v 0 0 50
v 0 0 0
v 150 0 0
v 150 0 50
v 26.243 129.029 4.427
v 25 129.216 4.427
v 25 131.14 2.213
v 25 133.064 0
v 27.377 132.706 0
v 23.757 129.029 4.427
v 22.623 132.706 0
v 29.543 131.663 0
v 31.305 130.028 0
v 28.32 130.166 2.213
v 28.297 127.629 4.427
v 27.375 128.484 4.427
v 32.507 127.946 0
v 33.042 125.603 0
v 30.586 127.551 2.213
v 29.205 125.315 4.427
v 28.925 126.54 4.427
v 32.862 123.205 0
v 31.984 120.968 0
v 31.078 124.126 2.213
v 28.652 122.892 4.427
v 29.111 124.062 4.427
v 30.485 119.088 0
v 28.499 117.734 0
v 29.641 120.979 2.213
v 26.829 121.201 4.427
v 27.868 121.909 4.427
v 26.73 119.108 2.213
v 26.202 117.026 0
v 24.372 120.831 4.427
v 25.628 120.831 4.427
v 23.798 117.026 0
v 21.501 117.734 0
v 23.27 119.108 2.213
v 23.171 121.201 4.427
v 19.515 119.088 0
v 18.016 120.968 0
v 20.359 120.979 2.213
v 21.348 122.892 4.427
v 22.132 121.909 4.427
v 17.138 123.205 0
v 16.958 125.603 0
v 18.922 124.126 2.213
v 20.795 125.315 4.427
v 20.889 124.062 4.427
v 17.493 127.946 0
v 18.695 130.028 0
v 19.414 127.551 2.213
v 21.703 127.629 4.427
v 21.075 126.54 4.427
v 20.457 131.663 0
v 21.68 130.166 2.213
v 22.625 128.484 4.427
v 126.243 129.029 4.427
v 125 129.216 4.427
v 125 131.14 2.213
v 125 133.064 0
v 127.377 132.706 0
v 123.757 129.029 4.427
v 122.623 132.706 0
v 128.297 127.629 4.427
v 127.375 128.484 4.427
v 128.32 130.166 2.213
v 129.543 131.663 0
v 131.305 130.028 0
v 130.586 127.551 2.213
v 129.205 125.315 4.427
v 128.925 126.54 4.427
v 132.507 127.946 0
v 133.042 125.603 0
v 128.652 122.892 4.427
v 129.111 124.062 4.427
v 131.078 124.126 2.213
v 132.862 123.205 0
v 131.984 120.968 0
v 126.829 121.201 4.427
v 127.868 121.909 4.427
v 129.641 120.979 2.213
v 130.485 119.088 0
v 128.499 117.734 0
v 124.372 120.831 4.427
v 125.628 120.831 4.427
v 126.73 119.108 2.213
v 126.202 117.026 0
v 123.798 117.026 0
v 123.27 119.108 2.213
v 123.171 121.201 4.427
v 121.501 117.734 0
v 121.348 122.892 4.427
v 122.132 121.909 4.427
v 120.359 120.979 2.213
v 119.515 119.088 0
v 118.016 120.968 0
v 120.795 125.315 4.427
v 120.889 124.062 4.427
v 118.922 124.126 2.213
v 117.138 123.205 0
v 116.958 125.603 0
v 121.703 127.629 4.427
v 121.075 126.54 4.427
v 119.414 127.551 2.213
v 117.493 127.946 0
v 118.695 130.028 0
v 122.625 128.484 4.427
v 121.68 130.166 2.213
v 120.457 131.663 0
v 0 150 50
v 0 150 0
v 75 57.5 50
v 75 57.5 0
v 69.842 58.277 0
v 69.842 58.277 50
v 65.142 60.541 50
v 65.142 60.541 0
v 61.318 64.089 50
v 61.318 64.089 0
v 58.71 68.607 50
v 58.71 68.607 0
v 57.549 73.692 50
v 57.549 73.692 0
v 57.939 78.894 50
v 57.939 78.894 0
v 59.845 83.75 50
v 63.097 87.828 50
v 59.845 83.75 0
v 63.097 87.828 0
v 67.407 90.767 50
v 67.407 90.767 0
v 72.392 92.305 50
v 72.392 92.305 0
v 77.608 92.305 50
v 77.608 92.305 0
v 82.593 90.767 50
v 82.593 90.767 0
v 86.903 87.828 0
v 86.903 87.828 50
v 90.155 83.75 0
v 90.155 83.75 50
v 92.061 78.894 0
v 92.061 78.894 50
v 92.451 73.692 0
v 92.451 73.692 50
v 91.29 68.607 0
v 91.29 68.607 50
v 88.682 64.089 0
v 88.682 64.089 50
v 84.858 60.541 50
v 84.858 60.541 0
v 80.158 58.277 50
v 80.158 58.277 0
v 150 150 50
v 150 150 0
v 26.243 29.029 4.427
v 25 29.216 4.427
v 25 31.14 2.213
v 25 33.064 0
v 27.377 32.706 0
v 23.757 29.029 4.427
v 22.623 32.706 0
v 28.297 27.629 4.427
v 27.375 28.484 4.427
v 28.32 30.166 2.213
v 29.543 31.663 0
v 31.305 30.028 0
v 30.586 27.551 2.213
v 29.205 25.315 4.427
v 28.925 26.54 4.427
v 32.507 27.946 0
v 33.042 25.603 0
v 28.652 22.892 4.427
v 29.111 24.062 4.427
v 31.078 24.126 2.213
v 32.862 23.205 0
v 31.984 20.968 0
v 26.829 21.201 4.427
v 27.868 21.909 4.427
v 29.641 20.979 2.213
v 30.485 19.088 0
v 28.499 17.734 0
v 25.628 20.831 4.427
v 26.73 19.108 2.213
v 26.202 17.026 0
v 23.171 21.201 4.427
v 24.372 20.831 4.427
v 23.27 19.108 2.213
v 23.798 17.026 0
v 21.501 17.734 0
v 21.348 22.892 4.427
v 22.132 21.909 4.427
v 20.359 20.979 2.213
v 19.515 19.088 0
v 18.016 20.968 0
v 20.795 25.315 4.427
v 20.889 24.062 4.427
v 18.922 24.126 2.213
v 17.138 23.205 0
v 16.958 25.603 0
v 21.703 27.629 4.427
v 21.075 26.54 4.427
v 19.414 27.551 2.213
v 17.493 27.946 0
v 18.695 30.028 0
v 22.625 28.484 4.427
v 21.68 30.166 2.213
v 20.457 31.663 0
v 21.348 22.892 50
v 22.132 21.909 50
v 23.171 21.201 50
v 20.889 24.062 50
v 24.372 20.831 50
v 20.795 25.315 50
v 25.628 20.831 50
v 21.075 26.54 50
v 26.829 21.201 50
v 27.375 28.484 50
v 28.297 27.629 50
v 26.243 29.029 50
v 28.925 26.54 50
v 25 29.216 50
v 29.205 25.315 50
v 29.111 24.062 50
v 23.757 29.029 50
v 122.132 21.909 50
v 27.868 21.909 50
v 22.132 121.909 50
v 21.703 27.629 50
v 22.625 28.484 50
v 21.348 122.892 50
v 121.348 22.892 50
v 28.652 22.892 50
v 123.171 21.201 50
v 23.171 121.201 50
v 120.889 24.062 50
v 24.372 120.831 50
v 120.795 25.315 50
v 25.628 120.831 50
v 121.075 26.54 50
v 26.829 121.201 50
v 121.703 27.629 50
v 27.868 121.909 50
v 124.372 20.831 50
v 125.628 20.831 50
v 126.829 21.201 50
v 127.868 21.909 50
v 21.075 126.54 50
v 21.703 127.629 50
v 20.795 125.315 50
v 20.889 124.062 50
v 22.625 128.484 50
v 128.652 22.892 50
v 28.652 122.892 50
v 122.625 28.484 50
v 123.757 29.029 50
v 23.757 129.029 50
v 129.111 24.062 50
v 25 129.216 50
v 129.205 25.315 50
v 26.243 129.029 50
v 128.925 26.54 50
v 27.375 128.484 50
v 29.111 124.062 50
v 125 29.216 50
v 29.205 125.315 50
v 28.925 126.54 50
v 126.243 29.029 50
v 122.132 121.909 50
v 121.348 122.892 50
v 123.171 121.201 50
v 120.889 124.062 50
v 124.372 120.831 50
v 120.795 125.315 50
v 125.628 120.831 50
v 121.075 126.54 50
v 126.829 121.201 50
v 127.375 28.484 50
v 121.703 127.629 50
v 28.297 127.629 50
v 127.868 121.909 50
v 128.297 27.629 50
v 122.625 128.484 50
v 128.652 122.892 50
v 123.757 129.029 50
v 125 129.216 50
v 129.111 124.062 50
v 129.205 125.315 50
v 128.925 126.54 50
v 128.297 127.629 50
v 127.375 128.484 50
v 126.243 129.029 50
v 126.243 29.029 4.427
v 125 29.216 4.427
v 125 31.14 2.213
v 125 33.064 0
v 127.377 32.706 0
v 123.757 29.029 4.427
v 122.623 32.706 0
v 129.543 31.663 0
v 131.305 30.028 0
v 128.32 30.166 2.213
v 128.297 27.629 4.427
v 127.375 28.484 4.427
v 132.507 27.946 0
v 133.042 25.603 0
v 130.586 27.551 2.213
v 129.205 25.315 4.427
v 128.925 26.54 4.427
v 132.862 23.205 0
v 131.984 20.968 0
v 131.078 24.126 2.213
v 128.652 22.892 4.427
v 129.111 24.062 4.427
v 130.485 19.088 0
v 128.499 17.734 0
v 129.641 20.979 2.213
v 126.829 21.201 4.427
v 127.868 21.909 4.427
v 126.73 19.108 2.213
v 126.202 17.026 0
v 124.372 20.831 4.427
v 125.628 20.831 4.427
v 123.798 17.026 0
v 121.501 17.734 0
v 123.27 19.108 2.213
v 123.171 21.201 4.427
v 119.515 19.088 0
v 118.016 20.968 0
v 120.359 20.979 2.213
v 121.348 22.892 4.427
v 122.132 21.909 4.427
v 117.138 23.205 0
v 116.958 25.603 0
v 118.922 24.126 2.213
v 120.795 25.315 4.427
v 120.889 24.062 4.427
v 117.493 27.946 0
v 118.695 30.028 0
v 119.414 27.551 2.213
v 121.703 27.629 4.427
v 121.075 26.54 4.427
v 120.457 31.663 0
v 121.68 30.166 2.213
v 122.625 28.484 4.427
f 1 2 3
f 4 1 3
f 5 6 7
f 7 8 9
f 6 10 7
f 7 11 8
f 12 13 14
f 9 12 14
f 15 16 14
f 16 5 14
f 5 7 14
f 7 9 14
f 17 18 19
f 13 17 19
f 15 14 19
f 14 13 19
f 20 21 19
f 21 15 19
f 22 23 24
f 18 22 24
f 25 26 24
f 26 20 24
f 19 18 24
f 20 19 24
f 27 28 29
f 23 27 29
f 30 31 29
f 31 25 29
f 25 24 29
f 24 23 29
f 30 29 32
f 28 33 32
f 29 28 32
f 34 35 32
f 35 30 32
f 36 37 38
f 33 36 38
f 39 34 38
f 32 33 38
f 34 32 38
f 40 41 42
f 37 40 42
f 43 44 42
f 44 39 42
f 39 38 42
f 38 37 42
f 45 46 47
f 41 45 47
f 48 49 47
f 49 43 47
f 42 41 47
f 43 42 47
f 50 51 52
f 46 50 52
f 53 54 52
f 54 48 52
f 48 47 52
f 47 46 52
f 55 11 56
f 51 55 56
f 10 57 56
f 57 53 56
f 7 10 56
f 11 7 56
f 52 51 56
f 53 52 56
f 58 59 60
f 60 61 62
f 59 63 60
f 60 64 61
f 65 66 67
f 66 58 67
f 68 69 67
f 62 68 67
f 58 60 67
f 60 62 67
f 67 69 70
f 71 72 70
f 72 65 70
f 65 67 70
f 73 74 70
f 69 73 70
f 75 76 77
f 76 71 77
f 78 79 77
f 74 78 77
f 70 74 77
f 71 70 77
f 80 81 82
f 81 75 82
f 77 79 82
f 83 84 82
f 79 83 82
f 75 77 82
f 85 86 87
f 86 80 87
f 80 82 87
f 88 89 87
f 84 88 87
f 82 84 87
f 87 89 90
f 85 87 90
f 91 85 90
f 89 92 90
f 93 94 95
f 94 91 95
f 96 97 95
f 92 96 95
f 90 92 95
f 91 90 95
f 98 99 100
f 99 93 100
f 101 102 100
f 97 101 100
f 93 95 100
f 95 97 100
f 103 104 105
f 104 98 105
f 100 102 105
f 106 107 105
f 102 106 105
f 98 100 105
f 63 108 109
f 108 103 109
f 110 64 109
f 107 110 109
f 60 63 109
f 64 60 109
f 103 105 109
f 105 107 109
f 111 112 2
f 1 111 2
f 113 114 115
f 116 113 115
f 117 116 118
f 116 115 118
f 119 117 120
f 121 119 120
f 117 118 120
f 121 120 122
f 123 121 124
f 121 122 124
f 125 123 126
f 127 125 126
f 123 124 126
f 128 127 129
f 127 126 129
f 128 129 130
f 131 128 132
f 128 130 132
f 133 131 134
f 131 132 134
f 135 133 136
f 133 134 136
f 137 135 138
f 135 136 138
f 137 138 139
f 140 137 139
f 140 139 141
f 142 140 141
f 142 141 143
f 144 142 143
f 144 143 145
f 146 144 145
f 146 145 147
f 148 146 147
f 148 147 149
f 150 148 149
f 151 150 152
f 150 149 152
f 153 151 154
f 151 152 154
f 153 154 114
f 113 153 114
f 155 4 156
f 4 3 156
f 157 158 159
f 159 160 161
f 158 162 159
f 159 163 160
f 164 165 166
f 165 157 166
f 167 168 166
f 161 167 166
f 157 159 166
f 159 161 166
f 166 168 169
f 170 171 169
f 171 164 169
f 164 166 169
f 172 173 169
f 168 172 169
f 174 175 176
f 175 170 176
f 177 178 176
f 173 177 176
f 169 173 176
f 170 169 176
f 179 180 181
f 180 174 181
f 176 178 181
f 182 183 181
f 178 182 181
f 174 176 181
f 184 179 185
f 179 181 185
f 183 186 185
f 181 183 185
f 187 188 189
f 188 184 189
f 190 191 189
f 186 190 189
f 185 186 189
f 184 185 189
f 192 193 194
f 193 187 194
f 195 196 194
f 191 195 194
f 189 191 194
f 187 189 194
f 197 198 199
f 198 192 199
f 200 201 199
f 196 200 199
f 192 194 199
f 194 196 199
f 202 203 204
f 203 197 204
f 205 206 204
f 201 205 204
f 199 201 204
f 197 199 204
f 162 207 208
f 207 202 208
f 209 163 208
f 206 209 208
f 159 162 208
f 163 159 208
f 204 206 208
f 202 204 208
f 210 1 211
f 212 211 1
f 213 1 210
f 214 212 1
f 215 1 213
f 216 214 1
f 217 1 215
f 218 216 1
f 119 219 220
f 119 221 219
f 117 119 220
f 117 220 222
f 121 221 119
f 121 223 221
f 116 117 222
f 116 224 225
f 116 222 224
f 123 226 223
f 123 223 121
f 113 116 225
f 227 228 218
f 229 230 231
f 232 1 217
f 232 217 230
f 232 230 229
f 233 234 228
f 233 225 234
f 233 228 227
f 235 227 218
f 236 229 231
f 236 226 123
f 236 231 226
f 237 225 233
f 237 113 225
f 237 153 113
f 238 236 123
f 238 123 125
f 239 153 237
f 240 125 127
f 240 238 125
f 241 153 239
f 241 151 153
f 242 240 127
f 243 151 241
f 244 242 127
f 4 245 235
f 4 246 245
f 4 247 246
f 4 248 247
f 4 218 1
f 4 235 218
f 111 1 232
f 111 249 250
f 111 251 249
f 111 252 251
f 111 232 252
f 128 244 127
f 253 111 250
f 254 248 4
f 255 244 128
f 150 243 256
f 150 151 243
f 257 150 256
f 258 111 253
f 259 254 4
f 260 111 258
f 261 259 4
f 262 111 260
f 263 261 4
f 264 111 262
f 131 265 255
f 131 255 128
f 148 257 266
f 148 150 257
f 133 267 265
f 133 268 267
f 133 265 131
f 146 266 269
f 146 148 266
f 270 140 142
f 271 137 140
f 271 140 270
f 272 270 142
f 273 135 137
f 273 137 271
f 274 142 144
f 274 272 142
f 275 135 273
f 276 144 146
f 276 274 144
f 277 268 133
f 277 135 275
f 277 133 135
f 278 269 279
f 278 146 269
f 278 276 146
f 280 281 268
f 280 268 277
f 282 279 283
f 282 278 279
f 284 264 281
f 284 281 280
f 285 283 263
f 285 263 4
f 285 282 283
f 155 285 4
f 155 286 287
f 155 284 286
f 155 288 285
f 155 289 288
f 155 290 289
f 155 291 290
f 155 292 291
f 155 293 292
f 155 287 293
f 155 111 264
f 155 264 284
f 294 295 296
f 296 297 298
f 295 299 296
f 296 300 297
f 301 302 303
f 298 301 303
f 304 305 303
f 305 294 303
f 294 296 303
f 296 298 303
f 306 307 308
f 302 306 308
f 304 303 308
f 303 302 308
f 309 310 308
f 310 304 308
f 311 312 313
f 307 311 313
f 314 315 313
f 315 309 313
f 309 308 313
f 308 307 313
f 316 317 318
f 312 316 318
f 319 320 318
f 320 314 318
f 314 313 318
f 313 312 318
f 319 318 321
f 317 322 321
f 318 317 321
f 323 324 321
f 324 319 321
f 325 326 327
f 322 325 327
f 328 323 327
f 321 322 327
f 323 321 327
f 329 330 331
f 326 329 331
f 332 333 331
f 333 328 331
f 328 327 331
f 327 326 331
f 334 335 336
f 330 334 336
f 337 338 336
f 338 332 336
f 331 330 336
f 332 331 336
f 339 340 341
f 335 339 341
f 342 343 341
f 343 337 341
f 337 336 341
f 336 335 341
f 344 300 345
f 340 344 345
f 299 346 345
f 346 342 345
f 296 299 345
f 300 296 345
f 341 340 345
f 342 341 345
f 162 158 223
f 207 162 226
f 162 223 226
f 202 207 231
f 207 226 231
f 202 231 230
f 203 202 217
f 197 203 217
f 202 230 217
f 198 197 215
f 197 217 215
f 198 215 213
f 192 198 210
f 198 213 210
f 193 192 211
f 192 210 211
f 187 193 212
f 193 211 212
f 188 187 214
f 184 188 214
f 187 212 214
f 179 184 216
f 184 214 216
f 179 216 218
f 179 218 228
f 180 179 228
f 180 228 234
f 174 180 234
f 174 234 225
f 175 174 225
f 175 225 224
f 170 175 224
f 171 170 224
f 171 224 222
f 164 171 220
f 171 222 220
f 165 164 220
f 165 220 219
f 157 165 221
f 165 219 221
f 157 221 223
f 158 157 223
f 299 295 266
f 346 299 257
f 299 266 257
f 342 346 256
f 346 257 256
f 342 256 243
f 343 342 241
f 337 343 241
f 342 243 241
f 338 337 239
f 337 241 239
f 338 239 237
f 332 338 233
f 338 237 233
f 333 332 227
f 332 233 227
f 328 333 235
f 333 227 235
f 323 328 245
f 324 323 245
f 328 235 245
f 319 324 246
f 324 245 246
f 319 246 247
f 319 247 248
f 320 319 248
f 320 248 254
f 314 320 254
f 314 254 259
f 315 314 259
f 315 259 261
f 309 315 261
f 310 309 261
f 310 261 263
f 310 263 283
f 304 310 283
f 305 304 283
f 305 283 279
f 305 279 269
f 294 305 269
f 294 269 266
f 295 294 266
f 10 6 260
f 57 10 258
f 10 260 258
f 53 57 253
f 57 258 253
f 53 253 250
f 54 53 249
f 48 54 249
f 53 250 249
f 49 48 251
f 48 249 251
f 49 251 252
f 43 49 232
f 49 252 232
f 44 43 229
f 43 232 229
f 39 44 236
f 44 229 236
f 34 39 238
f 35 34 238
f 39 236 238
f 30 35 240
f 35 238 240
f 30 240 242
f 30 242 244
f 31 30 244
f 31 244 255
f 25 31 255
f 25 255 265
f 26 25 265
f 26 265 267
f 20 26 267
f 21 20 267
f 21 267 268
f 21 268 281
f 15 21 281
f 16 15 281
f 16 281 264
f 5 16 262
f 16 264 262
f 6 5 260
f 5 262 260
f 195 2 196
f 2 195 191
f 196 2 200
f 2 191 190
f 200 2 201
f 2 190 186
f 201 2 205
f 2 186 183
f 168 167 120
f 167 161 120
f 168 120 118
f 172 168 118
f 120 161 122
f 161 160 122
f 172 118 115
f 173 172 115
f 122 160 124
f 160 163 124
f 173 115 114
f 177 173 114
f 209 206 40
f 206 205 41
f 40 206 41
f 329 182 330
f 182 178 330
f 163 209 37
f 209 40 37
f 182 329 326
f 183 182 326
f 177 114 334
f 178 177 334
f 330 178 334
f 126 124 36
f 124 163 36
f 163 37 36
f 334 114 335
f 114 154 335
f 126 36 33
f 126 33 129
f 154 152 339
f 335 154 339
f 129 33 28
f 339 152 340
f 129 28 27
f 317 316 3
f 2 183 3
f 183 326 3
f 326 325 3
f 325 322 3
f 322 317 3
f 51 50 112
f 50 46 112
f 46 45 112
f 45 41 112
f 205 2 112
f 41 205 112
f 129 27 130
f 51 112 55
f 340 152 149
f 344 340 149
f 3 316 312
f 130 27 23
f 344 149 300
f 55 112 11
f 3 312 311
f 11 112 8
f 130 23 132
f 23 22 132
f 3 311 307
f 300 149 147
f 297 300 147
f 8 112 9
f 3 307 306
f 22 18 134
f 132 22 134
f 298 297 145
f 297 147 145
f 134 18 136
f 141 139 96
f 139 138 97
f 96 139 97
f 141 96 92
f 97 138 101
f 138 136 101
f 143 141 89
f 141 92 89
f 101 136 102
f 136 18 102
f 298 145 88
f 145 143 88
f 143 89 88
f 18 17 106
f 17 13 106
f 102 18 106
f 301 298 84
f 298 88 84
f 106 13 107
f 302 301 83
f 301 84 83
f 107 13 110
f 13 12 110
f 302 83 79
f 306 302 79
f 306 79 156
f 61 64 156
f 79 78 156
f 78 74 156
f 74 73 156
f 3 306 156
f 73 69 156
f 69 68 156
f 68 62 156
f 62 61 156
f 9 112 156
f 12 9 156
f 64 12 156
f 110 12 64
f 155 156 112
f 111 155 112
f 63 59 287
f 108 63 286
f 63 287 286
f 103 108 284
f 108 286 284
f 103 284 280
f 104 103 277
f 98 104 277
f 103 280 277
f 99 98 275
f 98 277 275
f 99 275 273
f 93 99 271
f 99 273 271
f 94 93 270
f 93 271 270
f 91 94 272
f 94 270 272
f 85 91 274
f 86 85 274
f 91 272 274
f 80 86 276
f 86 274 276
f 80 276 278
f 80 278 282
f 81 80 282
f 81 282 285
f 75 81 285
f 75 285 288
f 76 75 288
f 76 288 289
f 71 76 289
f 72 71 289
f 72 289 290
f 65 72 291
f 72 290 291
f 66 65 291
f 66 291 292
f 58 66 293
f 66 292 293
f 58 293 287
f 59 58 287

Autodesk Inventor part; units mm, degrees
ref_plane "YZ Plane" through (0, 0, 0) normal (1, 0, 0) x (0, 1, 0)
ref_plane "XZ Plane" through (0, 0, 0) normal (0, 1, 0) x (-1, 0, 0)
ref_plane "XY Plane" through (0, 0, 0) normal (0, 0, 1) x (1, 0, 0)
sketch "Sketch1" plane through (0, 0, 0) normal (0, 0, 1) x (1, 0, 0)
  line L0 (0, 0) -> (150, 0)
  line L1 (150, 0) -> (150, 150)
  line L2 (150, 150) -> (0, 150)
  line L3 (0, 150) -> (0, 0)
  dimension "d0" = 150
  dimension "d1" = 150
extrude "Extrusion1" add sketch "Sketch1" along normal blind 50
sketch "Sketch2" plane through (0, 0, 50) normal (0, 0, 1) x (1, 0, 0)
  line L0 (150, 0) -> (150, 150) projected
  line L1 (150, 150) -> (0, 150) projected
  point P0 (0, 0)
  point P1 (75, 75)
  point P2 (150, 75)
  point P3 (75, 150)
hole "Hole1" at (75, 75, 50) direction (0, 0, -1) diameter 35 end through all
sketch "Sketch3" plane through (0, 0, 0) normal (0, 0, -1) x (-1, 0, 0)
  line L0 (-150, 150) -> (0, 150) projected
  line L1 (0, 150) -> (0, 0) projected
  line L2 (0, 0) -> (-150, 0) projected
  line L3 (-150, 0) -> (-150, 150) projected
  point P0 (-125, 125)
  point P1 (-25, 125)
  point P2 (-25, 25)
  point P3 (-125, 25)
  dimension "d11" = 25
  dimension "d12" = 25
  dimension "d13" = 25
  dimension "d14" = 25
hole "Hole2" at (125, 125, 0) at (25, 125, 0) at (25, 25, 0) at (125, 25, 0) direction (0, 0, 1) diameter 8.433 end through all countersink diameter 16.129 countersink angle 82 clearance for "Flat Head Machine Screw (82)" size "5/16" standard "Ansi Unified Screw Threads"
equation "\"d12\" = d11"
equation "\"d13\" = d11"
equation "\"d14\" = d11"
properties part number "Top_Spacer" material "Wood (Birch)"
